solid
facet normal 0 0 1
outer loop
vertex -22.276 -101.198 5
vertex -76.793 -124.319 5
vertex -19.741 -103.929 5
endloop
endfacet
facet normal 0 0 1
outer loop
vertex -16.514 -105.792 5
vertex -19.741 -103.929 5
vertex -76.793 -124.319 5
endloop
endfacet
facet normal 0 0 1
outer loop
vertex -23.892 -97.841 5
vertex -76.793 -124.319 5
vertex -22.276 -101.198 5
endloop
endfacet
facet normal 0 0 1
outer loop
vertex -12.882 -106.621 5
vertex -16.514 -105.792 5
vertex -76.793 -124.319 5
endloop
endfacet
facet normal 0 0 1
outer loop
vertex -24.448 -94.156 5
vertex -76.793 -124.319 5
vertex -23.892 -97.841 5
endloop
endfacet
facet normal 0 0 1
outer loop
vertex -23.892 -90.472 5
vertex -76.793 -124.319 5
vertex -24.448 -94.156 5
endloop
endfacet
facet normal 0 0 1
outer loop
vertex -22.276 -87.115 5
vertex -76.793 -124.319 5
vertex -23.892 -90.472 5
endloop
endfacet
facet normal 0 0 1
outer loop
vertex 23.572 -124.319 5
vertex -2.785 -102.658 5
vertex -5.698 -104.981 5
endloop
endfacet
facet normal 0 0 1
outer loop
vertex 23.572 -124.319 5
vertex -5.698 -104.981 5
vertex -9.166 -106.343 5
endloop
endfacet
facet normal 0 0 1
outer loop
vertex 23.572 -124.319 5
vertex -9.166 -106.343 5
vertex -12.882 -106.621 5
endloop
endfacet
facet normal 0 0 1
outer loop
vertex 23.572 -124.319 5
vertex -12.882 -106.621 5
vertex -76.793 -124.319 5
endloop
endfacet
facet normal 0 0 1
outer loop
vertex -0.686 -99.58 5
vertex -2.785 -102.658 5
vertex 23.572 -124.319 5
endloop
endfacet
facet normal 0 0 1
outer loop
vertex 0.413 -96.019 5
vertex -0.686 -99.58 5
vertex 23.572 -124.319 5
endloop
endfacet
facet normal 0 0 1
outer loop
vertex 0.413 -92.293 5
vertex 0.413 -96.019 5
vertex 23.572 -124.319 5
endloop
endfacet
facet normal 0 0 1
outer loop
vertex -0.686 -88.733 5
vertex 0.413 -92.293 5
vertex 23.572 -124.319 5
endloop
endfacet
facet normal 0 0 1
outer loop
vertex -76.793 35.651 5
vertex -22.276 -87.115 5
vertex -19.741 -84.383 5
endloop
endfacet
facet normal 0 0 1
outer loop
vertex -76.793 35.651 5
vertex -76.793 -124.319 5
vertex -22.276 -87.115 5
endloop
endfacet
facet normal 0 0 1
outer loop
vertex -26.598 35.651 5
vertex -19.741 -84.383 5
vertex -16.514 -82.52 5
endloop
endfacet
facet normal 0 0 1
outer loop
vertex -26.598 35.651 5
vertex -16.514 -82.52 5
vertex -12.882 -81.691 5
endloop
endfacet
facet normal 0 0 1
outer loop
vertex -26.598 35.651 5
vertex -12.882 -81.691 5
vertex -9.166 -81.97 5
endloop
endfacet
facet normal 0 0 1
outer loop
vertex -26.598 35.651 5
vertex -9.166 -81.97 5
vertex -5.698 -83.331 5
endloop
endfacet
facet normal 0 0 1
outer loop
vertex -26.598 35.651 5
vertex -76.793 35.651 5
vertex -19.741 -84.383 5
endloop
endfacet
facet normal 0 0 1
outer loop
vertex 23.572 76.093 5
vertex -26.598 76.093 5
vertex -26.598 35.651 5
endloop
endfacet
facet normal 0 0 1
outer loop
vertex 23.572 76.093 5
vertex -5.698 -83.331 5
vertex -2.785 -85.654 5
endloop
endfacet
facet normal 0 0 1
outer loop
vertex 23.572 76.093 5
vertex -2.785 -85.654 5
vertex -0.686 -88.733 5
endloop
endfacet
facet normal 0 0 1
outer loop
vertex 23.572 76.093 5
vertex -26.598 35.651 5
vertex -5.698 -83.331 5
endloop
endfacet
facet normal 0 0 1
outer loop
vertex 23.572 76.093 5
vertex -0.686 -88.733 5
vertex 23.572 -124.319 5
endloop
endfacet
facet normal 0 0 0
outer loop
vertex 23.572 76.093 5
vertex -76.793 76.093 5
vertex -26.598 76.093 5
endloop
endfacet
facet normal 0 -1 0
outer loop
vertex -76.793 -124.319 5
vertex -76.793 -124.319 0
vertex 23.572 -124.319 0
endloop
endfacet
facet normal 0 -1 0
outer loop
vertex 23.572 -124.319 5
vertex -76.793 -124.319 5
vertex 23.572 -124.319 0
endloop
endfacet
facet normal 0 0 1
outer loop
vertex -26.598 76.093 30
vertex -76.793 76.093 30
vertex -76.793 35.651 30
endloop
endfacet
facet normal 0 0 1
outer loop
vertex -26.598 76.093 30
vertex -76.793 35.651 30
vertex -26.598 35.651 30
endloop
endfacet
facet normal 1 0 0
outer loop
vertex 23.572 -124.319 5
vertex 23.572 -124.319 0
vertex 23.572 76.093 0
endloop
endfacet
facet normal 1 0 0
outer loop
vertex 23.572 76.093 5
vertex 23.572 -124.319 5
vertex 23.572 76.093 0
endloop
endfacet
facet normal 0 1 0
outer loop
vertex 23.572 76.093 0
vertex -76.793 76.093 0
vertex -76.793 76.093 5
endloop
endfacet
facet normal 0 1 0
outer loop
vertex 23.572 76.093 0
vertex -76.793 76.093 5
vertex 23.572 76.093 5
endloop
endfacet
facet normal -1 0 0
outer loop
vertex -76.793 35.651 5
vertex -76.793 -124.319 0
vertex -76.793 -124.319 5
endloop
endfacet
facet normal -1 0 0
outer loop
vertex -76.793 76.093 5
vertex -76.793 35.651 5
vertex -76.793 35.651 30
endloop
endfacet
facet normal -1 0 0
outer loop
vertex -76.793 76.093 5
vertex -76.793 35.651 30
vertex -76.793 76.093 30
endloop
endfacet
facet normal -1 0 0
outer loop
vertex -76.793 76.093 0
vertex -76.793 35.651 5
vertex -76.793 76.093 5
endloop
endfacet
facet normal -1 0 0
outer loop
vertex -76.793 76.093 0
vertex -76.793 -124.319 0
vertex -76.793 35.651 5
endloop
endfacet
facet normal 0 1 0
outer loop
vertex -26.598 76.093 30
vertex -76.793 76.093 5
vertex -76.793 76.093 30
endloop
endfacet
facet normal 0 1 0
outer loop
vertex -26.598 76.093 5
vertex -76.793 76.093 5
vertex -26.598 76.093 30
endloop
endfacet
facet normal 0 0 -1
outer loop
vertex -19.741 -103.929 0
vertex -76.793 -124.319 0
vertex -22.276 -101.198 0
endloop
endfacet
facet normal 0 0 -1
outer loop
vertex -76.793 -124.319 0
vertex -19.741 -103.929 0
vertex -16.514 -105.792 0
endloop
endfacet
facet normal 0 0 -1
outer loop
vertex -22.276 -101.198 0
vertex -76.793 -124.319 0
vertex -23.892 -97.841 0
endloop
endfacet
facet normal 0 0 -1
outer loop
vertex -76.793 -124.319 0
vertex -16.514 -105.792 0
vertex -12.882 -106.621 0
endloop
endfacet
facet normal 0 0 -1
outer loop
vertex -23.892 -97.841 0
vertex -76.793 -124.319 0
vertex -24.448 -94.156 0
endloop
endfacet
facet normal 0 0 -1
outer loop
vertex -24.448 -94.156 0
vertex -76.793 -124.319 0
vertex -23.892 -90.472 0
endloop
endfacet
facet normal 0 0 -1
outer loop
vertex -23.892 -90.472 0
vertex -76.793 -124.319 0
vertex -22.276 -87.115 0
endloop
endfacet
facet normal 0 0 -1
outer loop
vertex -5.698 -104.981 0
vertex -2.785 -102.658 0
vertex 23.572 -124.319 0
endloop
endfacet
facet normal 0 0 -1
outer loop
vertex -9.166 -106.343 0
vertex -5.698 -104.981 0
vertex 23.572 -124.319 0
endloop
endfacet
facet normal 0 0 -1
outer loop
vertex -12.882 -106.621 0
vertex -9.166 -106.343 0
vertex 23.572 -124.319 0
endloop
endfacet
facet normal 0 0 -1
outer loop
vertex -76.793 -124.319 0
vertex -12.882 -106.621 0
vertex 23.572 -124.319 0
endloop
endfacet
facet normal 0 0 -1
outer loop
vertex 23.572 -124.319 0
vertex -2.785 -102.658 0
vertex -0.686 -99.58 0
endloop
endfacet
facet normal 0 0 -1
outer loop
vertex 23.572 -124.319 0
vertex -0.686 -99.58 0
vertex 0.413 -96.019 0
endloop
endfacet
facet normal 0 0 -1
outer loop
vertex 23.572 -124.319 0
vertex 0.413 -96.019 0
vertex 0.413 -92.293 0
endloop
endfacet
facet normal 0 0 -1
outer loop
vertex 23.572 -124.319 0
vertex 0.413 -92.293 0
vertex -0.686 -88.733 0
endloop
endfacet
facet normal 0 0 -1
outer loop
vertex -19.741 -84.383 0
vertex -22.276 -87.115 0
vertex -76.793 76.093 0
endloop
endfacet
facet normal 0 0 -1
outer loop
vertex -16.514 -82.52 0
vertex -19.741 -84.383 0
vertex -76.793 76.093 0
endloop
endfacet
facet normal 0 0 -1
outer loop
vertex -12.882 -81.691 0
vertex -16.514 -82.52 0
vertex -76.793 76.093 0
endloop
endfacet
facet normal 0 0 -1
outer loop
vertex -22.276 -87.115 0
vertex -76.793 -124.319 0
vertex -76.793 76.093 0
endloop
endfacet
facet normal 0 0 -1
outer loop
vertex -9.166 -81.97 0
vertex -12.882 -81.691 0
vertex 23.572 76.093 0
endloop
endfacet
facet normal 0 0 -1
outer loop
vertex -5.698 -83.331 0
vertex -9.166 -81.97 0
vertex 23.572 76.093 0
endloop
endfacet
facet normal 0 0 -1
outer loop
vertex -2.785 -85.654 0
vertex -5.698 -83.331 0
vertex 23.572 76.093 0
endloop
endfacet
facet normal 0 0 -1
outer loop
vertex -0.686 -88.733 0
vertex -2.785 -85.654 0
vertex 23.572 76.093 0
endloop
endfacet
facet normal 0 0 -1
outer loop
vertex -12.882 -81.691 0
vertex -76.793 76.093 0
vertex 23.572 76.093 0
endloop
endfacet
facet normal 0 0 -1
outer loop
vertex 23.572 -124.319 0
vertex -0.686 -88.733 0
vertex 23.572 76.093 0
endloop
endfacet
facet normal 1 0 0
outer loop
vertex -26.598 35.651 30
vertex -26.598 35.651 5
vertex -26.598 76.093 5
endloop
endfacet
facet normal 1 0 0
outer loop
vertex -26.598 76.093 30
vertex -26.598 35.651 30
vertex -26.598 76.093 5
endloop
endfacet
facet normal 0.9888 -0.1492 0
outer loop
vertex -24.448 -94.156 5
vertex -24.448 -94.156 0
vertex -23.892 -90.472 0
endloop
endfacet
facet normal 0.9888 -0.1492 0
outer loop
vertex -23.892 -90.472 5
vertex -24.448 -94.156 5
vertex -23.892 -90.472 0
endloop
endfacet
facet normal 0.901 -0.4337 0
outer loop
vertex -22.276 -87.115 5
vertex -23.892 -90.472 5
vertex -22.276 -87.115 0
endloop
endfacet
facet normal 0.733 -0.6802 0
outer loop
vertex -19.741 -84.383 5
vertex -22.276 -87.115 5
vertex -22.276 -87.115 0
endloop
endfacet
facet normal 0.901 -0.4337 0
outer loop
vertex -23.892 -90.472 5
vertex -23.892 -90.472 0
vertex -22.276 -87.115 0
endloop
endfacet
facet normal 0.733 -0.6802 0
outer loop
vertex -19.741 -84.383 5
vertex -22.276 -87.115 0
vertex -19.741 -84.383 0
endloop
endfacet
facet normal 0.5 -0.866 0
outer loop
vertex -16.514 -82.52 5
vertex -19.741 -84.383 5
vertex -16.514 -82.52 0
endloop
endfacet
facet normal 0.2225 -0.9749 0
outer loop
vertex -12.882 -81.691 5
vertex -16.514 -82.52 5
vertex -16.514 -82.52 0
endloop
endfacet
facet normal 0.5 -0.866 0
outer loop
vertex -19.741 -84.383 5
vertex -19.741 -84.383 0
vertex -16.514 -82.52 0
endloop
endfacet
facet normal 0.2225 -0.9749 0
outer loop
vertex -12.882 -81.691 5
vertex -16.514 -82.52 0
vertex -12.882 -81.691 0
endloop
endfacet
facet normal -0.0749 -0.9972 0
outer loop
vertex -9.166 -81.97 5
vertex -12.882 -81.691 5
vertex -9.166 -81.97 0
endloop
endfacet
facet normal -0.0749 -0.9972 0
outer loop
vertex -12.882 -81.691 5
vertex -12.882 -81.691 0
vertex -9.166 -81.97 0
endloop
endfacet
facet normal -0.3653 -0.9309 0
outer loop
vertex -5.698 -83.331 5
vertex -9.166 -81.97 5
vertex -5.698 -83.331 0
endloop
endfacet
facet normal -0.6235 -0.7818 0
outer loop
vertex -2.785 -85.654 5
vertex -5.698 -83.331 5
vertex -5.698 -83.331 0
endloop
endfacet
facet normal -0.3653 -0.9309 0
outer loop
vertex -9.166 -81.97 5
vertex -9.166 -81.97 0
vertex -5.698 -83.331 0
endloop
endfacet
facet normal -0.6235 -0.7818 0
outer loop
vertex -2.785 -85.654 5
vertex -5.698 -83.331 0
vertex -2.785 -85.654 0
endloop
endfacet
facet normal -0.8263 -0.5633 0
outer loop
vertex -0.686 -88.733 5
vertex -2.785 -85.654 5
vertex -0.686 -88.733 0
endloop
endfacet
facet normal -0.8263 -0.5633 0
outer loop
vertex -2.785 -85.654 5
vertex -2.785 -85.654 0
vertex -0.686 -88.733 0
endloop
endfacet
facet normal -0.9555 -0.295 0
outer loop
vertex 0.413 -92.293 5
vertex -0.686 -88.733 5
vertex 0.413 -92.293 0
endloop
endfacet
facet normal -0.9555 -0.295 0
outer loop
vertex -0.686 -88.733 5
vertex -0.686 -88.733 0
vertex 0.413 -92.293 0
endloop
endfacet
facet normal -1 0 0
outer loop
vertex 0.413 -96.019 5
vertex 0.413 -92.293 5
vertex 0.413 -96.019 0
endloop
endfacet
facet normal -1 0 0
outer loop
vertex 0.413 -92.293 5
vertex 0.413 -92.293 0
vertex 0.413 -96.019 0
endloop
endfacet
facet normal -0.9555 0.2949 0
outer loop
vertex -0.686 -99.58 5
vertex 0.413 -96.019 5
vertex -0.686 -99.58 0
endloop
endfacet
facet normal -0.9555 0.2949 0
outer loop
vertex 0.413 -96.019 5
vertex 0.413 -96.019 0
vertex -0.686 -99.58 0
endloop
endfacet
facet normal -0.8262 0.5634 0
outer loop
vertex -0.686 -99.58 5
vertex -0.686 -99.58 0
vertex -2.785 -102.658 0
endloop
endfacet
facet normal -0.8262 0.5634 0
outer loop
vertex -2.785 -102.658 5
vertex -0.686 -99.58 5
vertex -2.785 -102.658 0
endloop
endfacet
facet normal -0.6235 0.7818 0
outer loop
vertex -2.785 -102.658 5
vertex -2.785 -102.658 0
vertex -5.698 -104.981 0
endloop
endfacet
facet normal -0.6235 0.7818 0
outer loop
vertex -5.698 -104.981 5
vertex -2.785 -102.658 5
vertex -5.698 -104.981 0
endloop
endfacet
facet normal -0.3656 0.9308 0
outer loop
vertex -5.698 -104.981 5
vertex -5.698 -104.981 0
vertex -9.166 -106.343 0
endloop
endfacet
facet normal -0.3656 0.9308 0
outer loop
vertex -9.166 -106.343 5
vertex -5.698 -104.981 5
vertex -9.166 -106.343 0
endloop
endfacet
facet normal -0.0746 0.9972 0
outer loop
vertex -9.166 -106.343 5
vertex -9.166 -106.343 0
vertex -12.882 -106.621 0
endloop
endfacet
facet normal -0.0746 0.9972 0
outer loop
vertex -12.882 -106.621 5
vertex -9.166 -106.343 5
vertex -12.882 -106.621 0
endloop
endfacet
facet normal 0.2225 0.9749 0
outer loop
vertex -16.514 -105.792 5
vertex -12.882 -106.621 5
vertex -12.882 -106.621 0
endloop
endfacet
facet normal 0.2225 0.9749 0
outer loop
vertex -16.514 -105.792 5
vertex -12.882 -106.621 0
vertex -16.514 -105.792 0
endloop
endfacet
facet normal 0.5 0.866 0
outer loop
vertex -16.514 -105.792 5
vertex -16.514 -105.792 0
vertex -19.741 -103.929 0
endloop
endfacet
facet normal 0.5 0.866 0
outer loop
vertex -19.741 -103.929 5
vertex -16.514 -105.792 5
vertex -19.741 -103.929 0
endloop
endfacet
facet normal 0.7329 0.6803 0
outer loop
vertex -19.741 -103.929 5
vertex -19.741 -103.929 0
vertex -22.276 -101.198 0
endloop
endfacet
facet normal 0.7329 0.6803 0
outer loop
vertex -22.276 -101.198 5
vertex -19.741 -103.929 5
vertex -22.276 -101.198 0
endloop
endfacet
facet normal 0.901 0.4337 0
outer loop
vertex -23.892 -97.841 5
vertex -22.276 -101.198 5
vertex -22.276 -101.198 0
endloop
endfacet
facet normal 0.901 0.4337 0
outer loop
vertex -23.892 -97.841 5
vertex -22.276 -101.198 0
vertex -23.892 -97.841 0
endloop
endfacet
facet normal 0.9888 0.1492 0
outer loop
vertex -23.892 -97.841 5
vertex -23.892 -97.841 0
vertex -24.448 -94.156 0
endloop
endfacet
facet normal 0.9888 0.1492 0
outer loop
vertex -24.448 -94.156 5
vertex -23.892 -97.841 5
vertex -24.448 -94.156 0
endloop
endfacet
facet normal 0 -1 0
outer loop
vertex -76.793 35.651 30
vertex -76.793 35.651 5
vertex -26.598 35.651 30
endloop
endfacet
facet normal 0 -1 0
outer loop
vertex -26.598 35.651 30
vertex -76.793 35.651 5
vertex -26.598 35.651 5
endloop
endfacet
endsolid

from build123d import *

# Parameters (mm, degrees)
F0_W     = 100.364631
F0_H     = 200.412475
F1_DEPTH = 5
F2_W     = 50.194541
F2_H     = 40.442418
F3_DEPTH = 25
F5_D     = 25


with BuildPart() as f1:
    # F0 (on Top) → F1 (new body)
    with BuildSketch(Plane.XY):
        with Locations((-26.610498, -24.112809)):
            Rectangle(F0_W, F0_H)
    extrude(amount=F1_DEPTH)

    # F2 (on face) → F3 (join)
    with BuildSketch(Plane.XY.offset(5)):
        with Locations((-51.695543, 55.872219)):
            Rectangle(F2_W, F2_H)
    extrude(amount=F3_DEPTH)

    # F5 (through all)
    with Locations(Plane.XY.offset(5)):
        with Locations((-11.947709, -94.156161)):
            Hole(F5_D / 2)


solid = f1.part
